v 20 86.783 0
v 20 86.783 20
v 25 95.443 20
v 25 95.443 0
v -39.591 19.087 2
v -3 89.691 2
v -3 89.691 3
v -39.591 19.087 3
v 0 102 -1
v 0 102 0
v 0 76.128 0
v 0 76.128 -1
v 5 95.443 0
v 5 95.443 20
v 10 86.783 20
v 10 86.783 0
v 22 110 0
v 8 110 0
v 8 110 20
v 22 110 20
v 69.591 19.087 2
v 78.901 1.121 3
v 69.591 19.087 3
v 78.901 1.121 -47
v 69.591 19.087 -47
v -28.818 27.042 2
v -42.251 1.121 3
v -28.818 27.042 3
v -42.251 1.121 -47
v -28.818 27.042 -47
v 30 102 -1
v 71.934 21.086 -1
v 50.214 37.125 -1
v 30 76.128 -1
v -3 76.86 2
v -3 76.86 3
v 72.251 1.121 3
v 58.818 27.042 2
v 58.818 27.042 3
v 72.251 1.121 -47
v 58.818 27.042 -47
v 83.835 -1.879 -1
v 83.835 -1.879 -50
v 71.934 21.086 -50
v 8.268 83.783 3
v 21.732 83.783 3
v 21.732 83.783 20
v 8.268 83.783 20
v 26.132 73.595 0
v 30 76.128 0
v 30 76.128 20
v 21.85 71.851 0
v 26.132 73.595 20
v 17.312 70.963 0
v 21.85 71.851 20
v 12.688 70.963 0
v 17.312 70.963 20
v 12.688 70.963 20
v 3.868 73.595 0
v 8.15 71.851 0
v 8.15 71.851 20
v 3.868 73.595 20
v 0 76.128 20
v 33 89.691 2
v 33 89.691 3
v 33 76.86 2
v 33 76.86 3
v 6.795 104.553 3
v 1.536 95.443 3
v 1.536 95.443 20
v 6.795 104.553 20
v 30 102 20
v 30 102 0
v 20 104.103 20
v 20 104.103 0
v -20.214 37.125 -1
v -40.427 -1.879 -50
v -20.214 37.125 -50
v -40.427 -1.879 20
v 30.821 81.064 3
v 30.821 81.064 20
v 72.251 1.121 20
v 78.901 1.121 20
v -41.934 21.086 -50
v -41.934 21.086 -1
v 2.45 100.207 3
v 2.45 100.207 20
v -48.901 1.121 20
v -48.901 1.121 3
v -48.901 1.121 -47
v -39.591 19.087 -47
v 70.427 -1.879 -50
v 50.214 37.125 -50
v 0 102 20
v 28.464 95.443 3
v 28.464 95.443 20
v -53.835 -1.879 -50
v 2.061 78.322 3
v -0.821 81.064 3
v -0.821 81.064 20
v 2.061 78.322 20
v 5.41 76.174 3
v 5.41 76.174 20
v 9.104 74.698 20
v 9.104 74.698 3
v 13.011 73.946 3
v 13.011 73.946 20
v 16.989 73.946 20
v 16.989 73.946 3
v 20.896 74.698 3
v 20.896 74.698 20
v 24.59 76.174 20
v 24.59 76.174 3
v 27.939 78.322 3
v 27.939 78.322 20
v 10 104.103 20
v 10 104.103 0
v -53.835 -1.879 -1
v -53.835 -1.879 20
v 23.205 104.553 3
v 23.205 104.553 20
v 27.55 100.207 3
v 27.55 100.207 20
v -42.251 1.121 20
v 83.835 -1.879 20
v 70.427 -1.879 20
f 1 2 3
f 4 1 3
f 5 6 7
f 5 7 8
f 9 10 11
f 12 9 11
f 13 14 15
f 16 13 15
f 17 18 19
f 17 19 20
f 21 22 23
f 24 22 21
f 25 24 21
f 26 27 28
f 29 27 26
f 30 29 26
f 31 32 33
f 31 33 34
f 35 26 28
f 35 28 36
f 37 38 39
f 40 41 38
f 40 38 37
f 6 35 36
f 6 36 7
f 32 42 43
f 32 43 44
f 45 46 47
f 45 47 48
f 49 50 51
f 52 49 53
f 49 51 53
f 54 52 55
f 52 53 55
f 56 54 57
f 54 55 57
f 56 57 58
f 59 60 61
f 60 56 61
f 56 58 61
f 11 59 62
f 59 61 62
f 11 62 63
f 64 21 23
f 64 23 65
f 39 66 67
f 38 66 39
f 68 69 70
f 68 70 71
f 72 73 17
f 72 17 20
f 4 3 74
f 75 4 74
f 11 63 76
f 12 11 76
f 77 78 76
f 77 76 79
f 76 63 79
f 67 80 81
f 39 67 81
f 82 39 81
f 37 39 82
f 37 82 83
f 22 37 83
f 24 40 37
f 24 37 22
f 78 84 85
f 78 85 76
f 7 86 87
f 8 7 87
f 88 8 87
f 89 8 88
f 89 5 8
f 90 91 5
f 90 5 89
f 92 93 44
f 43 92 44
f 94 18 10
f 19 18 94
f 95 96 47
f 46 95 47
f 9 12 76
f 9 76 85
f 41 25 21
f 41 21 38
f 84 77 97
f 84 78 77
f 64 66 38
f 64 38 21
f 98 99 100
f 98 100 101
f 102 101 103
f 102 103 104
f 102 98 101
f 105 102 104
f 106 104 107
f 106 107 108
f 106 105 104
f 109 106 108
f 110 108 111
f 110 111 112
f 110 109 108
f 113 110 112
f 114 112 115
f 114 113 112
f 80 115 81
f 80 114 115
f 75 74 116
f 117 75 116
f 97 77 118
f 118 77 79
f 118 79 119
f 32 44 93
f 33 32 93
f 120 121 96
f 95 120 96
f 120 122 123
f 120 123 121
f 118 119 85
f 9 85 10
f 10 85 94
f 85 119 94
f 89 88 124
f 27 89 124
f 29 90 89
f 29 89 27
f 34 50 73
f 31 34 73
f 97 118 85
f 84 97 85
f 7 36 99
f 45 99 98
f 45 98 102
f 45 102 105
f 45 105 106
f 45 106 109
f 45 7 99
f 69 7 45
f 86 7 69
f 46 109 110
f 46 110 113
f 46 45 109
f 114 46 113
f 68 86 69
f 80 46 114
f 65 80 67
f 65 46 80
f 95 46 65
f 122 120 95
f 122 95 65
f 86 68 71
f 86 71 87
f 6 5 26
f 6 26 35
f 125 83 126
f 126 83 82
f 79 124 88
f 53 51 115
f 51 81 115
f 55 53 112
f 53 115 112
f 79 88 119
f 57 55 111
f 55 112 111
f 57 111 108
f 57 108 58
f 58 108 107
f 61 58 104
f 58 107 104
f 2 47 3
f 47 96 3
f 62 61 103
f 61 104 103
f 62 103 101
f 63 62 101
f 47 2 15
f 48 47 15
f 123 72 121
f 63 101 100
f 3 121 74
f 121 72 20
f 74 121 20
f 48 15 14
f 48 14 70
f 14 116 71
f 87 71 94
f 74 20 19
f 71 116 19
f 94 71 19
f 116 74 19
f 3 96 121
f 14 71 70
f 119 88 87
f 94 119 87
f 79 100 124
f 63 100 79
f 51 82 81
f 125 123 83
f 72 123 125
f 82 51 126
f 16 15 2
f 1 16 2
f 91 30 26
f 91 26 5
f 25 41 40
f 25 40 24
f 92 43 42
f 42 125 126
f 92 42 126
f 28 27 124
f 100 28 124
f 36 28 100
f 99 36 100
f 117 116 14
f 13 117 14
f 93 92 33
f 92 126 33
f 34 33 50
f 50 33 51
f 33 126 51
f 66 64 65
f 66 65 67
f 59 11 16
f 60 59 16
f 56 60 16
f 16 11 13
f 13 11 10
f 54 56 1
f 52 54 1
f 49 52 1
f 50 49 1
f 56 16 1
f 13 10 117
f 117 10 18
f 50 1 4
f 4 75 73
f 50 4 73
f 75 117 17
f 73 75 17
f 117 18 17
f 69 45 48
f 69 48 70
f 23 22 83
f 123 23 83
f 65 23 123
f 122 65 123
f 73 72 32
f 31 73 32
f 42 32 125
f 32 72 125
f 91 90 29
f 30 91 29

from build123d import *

# Parameters (mm, degrees)
SKETCH1_W                = 30
SKETCH1_H                = 110
BOSS_EXTRUDE1_DEPTH      = 20
CUT_EXTRUDE1_DEPTH       = 60
CHAMFER1_SIZE            = 8
BOSS_EXTRUDE2_DEPTH      = 21
BOSS_EXTRUDE3_DEPTH      = 50
BOSS_EXTRUDE3_DEPTH_BACK = 18
CUT_EXTRUDE3_DEPTH       = 260
SHELL1_START             = 3
SHELL1_DEPTH             = 17
SHELL1_START_2           = -47
SHELL1_2_DEPTH           = 50
SHELL1_START_3           = 2
SHELL1_3_DEPTH           = 1


# Read off the part's stored shape, not the designer's step: Shell1
with BuildPart() as part:
    # Sketch1 → Boss-Extrude1 (new body)
    with BuildSketch(Plane.XY):
        with Locations((15, 55)):
            Rectangle(SKETCH1_W, SKETCH1_H)
    extrude(amount=BOSS_EXTRUDE1_DEPTH)

    # Sketch2 → Cut-Extrude1 (cut)
    with BuildSketch(Plane.XY.offset(20)):
        Polygon((25, 95.443111243), (20, 104.103365281), (10, 104.103365281), (5, 95.443111243), (10, 86.782857205), (20, 86.782857205), align=None)
    extrude(amount=-CUT_EXTRUDE1_DEPTH, mode=Mode.SUBTRACT)

    # Chamfer1
    chamfer1_edges = [part.edges().sort_by_distance(p)[0] for p in [
        (0, 110, 10),
        (30, 110, 10),
    ]]
    chamfer(chamfer1_edges, length=CHAMFER1_SIZE)

    # Sketch3 → Boss-Extrude2 (add)
    with BuildSketch(Plane.XY.offset(20)):
        Polygon((-40.427156972, -1.878677735), (-53.835121548, -1.878677735), (0, 102), (0, 76.128383271), align=None)
        Polygon((30, 102), (83.835121548, -1.878677735), (70.427156972, -1.878677735), (30, 76.128383271), align=None)
    extrude(amount=-BOSS_EXTRUDE2_DEPTH)

    # Sketch5 → Boss-Extrude3 (add, two sides: drawn at the far end of the back side and taken through both)
    with BuildSketch(Plane(origin=(0, 0, 0), x_dir=(-1, 0, 0), z_dir=(0, 0, -1)).offset(-BOSS_EXTRUDE3_DEPTH_BACK)):
        Polygon((-83.835121548, -1.878677735), (-71.933606609, 21.086137785), (-50.213578486, 37.124852768), (-70.427156972, -1.878677735), align=None)
        Polygon((40.427156972, -1.878677735), (53.835121548, -1.878677735), (41.933606609, 21.086137785), (20.213578486, 37.124852768), align=None)
    extrude(amount=BOSS_EXTRUDE3_DEPTH + BOSS_EXTRUDE3_DEPTH_BACK)

    # Sketch8 → Cut-Extrude3 (cut)
    with BuildSketch(Plane.XY.offset(20)):
        with BuildLine():
            Line((0, 76.128383271), (0, -18.897317389))
            Line((0, -18.897317389), (30, -18.897317389))
            Line((30, -18.897317389), (30, 76.128383271))
            ThreePointArc((30, 76.128383271), (15, 70.851219372), (0, 76.128383271))
        make_face()
    extrude(amount=-CUT_EXTRUDE3_DEPTH, mode=Mode.SUBTRACT)

    # Shell1 outline → Shell1 (cut)
    with BuildSketch(Plane.XY.offset(SHELL1_START)):
        with BuildLine():
            Line((28.464101615, 95.443111243), (21.732050808, 83.782857205))
            Line((21.732050808, 83.782857205), (8.267949192, 83.782857205))
            Line((8.267949192, 83.782857205), (1.535898385, 95.443111243))
            Line((1.535898385, 95.443111243), (6.795296251, 104.552655563))
            Line((6.795296251, 104.552655563), (2.449804376, 100.207163689))
            Line((2.449804376, 100.207163689), (-48.901429901, 1.121322265))
            Line((-48.901429901, 1.121322265), (-42.251348803, 1.121322265))
            Line((-42.251348803, 1.121322265), (-0.820872426, 81.064359083))
            ThreePointArc((-0.820872426, 81.064359083), (15, 73.851219372), (30.820872426, 81.064359083))
            Line((30.820872426, 81.064359083), (72.251348803, 1.121322265))
            Line((72.251348803, 1.121322265), (78.901429901, 1.121322265))
            Line((78.901429901, 1.121322265), (27.550195624, 100.207163689))
            Line((27.550195624, 100.207163689), (23.204703749, 104.552655563))
            Line((23.204703749, 104.552655563), (28.464101615, 95.443111243))
        make_face()
    extrude(amount=SHELL1_DEPTH, mode=Mode.SUBTRACT)

    # Shell1 2 outline → Shell1 2 (cut)
    with BuildSketch(Plane.XY.offset(SHELL1_START_2)):
        Polygon((78.901429901, 1.121322265), (69.590785527, 19.086869637), (58.818087877, 27.041750092), (72.251348803, 1.121322265), align=None)
        Polygon((-28.818087877, 27.041750092), (-39.590785527, 19.086869637), (-48.901429901, 1.121322265), (-42.251348803, 1.121322265), align=None)
    extrude(amount=SHELL1_2_DEPTH, mode=Mode.SUBTRACT)

    # Shell1 3 outline → Shell1 3 (cut)
    with BuildSketch(Plane.XY.offset(SHELL1_START_3)):
        Polygon((69.590785527, 19.086869637), (33, 89.691380382), (33, 76.85957818), (58.818087877, 27.041750092), align=None)
        Polygon((-3, 76.85957818), (-3, 89.691380382), (-39.590785527, 19.086869637), (-28.818087877, 27.041750092), align=None)
    extrude(amount=SHELL1_3_DEPTH, mode=Mode.SUBTRACT)


solid = part.part
